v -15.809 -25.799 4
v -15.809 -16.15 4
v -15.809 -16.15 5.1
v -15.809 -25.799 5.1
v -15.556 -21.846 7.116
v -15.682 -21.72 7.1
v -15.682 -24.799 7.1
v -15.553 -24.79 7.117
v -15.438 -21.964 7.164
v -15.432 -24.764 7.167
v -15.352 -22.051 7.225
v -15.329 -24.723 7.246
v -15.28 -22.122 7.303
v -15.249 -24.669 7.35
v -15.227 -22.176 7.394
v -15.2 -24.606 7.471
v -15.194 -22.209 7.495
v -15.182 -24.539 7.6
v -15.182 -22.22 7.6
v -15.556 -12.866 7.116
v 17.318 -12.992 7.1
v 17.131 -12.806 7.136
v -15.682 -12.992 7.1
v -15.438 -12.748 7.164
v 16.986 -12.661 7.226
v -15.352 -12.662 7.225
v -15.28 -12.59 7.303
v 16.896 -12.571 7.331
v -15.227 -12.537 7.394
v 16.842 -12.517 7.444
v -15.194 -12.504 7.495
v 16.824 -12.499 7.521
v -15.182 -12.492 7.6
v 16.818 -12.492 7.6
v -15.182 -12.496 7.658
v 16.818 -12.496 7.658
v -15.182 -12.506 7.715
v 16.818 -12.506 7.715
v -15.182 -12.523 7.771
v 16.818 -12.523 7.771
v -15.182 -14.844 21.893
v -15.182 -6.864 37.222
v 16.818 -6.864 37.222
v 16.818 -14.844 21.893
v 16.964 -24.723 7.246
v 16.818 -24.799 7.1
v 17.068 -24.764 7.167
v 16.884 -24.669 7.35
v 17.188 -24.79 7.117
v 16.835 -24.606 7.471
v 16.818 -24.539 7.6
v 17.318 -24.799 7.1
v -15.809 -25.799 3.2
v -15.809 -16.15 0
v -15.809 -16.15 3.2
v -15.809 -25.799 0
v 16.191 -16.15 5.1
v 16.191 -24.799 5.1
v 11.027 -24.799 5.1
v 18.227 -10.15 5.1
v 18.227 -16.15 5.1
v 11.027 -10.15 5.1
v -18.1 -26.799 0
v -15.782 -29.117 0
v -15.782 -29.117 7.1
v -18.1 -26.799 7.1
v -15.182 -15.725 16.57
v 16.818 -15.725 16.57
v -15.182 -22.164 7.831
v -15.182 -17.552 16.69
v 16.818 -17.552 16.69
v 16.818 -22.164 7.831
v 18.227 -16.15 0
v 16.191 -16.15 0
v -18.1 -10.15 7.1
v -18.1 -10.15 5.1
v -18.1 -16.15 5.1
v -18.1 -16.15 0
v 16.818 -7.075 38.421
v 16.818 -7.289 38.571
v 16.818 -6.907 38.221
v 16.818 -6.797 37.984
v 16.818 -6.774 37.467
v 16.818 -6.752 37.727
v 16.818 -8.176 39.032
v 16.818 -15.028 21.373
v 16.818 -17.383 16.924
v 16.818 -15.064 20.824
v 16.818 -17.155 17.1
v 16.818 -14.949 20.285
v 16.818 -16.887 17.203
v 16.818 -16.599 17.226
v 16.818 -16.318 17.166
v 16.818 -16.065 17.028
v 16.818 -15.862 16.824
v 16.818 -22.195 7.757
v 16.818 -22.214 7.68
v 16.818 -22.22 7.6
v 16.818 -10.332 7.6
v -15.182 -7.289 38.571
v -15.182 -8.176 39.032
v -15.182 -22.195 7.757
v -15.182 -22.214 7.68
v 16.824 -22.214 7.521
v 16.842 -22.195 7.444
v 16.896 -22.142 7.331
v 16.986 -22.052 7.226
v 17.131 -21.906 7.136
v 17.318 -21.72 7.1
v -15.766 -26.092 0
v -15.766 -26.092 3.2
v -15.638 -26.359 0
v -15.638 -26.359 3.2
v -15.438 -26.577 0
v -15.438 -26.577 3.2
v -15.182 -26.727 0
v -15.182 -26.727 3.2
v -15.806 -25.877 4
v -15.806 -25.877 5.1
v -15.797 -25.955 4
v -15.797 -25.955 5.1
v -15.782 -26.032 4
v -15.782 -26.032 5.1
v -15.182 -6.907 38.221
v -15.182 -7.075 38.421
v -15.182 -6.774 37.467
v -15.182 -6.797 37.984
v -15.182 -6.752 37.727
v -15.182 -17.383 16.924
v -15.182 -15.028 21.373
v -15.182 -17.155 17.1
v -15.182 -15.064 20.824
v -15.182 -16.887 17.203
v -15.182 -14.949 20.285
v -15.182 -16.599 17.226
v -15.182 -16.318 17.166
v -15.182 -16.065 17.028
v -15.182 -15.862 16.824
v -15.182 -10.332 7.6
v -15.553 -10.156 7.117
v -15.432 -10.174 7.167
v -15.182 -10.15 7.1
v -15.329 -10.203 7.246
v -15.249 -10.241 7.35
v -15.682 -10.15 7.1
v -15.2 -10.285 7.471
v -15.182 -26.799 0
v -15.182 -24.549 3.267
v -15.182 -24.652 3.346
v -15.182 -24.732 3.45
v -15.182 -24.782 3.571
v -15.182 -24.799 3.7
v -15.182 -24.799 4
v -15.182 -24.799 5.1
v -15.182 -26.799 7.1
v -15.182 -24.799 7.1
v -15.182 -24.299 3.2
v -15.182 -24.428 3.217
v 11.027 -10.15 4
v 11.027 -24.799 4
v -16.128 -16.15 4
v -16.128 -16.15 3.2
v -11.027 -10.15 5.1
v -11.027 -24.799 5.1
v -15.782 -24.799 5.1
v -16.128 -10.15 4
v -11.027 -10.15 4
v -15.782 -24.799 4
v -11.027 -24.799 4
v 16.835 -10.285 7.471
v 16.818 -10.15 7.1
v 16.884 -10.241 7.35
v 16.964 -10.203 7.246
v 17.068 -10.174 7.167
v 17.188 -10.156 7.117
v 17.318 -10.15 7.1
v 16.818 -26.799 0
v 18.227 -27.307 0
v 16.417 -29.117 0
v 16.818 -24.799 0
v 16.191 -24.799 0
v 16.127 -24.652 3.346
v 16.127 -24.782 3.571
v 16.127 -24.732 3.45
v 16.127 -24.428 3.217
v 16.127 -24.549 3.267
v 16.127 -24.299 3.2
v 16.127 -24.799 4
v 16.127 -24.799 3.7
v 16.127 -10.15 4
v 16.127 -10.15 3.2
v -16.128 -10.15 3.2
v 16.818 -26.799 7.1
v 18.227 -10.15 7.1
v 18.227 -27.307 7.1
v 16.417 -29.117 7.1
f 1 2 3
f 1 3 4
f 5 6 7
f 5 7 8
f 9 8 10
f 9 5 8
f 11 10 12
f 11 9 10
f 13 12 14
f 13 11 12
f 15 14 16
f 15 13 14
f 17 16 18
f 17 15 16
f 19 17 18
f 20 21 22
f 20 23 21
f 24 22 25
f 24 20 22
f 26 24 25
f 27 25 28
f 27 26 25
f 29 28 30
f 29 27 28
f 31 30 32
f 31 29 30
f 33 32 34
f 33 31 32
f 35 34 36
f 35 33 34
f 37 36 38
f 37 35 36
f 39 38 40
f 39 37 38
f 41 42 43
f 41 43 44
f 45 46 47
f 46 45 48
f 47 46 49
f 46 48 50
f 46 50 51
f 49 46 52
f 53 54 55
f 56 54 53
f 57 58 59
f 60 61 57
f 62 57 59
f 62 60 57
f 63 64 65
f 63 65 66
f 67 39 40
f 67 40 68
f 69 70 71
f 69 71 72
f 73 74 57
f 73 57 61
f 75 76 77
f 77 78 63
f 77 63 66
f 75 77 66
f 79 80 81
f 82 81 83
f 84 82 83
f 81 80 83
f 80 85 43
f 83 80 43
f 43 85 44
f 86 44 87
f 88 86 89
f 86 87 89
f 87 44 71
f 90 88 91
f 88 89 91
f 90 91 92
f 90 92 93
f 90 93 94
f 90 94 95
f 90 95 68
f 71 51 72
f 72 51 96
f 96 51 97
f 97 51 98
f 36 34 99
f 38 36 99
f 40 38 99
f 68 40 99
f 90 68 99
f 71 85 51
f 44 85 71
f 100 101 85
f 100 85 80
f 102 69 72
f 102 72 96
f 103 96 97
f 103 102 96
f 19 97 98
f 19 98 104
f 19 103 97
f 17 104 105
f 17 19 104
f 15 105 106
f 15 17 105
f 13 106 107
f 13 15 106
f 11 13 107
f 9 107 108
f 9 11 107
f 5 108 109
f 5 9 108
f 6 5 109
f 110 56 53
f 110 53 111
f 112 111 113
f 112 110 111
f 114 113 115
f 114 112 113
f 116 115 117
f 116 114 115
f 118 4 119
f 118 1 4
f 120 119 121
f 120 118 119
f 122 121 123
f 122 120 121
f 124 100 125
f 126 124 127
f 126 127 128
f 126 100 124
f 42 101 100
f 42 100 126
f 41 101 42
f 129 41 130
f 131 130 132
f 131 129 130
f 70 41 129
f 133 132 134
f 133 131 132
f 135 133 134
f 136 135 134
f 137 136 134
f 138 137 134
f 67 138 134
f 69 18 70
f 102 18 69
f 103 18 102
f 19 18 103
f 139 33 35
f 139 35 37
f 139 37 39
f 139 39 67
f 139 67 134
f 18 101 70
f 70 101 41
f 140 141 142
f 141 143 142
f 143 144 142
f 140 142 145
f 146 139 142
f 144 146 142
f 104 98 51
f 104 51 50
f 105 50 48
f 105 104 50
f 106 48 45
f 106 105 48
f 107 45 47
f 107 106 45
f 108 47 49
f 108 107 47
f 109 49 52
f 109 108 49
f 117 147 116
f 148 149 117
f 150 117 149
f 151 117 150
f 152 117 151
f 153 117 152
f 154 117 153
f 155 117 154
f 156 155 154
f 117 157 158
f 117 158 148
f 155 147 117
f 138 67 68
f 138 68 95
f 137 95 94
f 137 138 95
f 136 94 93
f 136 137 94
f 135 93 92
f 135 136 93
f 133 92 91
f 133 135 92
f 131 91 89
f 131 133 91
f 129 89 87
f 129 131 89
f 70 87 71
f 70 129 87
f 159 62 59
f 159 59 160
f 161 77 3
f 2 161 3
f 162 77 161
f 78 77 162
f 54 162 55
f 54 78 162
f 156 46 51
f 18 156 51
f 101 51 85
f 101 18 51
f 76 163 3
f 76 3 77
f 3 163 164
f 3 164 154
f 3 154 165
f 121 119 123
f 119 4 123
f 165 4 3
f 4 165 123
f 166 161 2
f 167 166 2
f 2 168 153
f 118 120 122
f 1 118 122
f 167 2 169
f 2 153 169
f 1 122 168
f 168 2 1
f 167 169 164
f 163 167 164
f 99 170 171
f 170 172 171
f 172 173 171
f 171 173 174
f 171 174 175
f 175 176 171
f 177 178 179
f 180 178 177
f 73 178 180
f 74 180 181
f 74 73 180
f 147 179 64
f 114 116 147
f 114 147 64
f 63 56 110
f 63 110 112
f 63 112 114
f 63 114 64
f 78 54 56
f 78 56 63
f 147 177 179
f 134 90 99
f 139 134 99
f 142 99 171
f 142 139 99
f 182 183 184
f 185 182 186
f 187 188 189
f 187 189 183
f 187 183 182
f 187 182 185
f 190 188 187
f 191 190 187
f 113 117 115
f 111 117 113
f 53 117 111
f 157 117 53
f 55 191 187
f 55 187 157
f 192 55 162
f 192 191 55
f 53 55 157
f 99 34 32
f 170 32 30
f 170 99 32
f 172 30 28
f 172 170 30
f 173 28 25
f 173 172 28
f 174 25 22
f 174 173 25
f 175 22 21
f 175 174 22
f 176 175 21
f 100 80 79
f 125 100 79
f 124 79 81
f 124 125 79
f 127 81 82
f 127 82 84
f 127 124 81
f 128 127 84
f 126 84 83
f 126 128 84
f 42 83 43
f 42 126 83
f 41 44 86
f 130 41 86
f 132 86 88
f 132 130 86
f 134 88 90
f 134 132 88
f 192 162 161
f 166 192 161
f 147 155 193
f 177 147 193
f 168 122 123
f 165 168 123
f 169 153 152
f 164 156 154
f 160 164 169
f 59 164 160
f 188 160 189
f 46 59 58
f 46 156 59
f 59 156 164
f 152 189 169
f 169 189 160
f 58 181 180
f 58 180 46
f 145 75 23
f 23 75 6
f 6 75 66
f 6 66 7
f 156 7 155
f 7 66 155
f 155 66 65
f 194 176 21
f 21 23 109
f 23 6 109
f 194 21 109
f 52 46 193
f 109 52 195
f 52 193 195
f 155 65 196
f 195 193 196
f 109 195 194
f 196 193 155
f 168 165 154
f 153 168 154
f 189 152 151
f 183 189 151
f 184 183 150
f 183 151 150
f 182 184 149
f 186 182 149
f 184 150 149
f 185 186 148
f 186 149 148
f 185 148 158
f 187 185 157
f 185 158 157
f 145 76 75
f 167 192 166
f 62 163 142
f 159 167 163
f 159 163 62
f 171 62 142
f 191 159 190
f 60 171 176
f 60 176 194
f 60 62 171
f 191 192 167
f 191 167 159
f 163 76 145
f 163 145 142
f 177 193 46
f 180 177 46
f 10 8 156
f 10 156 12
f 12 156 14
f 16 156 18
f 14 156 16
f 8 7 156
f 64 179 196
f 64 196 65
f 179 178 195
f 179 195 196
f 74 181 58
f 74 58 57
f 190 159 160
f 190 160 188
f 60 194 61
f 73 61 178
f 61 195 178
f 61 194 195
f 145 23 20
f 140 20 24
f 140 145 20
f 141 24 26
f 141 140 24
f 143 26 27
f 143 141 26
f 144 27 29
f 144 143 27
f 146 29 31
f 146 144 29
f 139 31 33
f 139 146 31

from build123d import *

# Parameters (mm, degrees)
EXTRUDE_1_DEPTH             = 7.1
EXTRUDE_2_DEPTH             = 6
EXTRUDE_2_DIRECTION_2_REACH = 25.469
SKETCH_3_W                  = 32
SKETCH_3_H                  = 2
CUT_EXTRUDE_1_DEPTH         = 36.077992299
SKETCH_4_W                  = 0.599335356
SKETCH_4_H                  = 1.1
EXTRUDE_3_DEPTH             = 4.31849548
EXTRUDE_4_DEPTH             = 32
FILLET_1_R                  = 0.5


with BuildPart() as part:
    # 草图1 → 凸台-拉伸1 (new body)
    with BuildSketch(Plane.XY):
        with BuildLine():
            Line((18.227330455, -16.15), (18.227330455, -27.306853771))
            Line((18.227330455, -27.306853771), (16.416835991, -29.117348235))
            Line((16.416835991, -29.117348235), (5.554207951, -29.117348235))
            Line((5.554207951, -29.117348235), (-15.781834721, -29.117348235))
            Line((-15.781834721, -29.117348235), (-18.100330201, -26.798852755))
            Line((-18.100330201, -26.798852755), (-18.100330201, -16.15))
            Line((-18.100330201, -16.15), (-15.809499619, -16.15))
            Line((-15.809499619, -16.15), (-15.809499619, -25.798852755))
            ThreePointArc((-15.809499619, -25.798852755), (-15.5166064, -26.505959536), (-14.809499619, -26.798852755))
            Line((-14.809499619, -26.798852755), (15.190500381, -26.798852755))
            ThreePointArc((15.190500381, -26.798852755), (15.897607162, -26.505959536), (16.190500381, -25.798852755))
            Line((16.190500381, -25.798852755), (16.190500381, -16.15))
            Line((16.190500381, -16.15), (18.227330455, -16.15))
        make_face()
    extrude(amount=EXTRUDE_1_DEPTH)

    # 草图2 → 凸台-拉伸2 (add)
    with BuildSketch(Plane(origin=(0, -16.15, 0), x_dir=(1, 0, 0), z_dir=(0, 1, 0))):
        Polygon((16.127330455, -4.000000069), (16.127330455, -3.200000069), (-16.127758191, -3.200000069), (-16.127758191, -4), (-11.027330455, -4), (-11.027330455, -5.1), (-18.100330201, -5.1), (-18.100330201, -7.1), (18.227330455, -7.1), (18.227330455, -5.100000069), (11.027330455, -5.100000069), (11.027330455, -4.000000069), align=None)
    extrude(amount=EXTRUDE_2_DEPTH)

    # 草图2 → 凸台-拉伸2 direction 2 (add, up to next)
    with BuildSketch(Plane(origin=(0, -16.15, 0), x_dir=(1, 0, 0), z_dir=(0, 1, 0)), mode=Mode.PRIVATE) as extrude_2_direction_2_sk1:
        Polygon((16.127330455, -4.000000069), (16.127330455, -3.200000069), (-16.127758191, -3.200000069), (-16.127758191, -4), (-11.027330455, -4), (-11.027330455, -5.1), (-18.100330201, -5.1), (-18.100330201, -7.1), (18.227330455, -7.1), (18.227330455, -5.100000069), (11.027330455, -5.100000069), (11.027330455, -4.000000069), align=None)
    extrude_2_direction_2_tool1 = extrude(extrude_2_direction_2_sk1.sketch, amount=-EXTRUDE_2_DIRECTION_2_REACH, mode=Mode.PRIVATE) - part.part
    add(extrude_2_direction_2_tool1.solids().sort_by_distance((0.03755, -16.15, 5.267913))[0])

    # 草图3 → 切除-拉伸1 (cut, through all)
    with BuildSketch(Plane.XY.offset(7.1)):
        with Locations((0.817500635, -25.798852755)):
            Rectangle(SKETCH_3_W, SKETCH_3_H)
    extrude(amount=-CUT_EXTRUDE_1_DEPTH, mode=Mode.SUBTRACT)

    # 草图4 → 凸台-拉伸3 (add)
    with BuildSketch(Plane.XZ.offset(29.117348235)):
        with Locations((-15.482167043, 4.55)):
            Rectangle(SKETCH_4_W, SKETCH_4_H)
    extrude(amount=-EXTRUDE_3_DEPTH)

    # 草图5 → 凸台-拉伸4 (add)
    with BuildSketch(Plane(origin=(-15.182499365, 0, 0), x_dir=(0, 0, -1), z_dir=(1, 0, 0))):
        with BuildLine():
            Line((-7.1, -24.798852755), (-39.032389994, -8.175902679))
            Line((-39.032389994, -8.175902679), (-38.570641381, -7.288891846))
            ThreePointArc((-38.570641381, -7.288891846), (-37.984336348, -6.796923508), (-37.221881935, -6.863629626))
            Line((-37.221881935, -6.863629626), (-21.892534432, -14.843582842))
            ThreePointArc((-21.892534432, -14.843582842), (-21.099843464, -15.065279022), (-20.284996919, -14.948946417))
            Line((-20.284996919, -14.948946417), (-7.1, -10.15))
            Line((-7.1, -10.15), (-7.1, -12.278355545))
            Line((-7.1, -12.278355545), (-16.570152711, -15.725209246))
            ThreePointArc((-16.570152711, -15.725209246), (-17.225991491, -16.599498737), (-16.689881181, -17.5519127))
            Line((-16.689881181, -17.5519127), (-7.1, -22.544088861))
            Line((-7.1, -22.544088861), (-7.1, -24.798852755))
        make_face()
    extrude(amount=EXTRUDE_4_DEPTH)

    # 圆角1
    # the kernel refuses this fillet: 0.5 mm, written as the material it adds along each edge
    with BuildSketch(Plane(origin=(-15.182499365, -21.294088861, 7.1), x_dir=(-1, 0, 0), z_dir=(0, -1, 0))) as fillet_1_piece_1_section:
        with BuildLine():
            CenterArc((FILLET_1_R, -FILLET_1_R), FILLET_1_R, 90, 90)
            Line((0, -FILLET_1_R), (-FILLET_1_R * 0.02, -FILLET_1_R))
            Line((-FILLET_1_R * 0.02, -FILLET_1_R), (-FILLET_1_R * 0.02, FILLET_1_R * 0.02))
            Line((-FILLET_1_R * 0.02, FILLET_1_R * 0.02), (FILLET_1_R, FILLET_1_R * 0.02))
            Line((FILLET_1_R, FILLET_1_R * 0.02), (FILLET_1_R, 0))
        make_face()
    fillet_1_piece_1 = extrude(amount=4.754763894, mode=Mode.PRIVATE)
    fillet_1_piece_1 = split(fillet_1_piece_1, bisect_by=Plane(origin=(-15.182499365, -23.618510105, 7.201736565), z_dir=(-1, 0, 0)), keep=Keep.TOP, mode=Mode.PRIVATE)
    fillet_1_piece_1 = split(fillet_1_piece_1, bisect_by=Plane(origin=(-15.30597489, -24.505520938, 7.663485178), z_dir=(0, 0.8870108331782195, -0.46174861323503813)), keep=Keep.TOP, mode=Mode.PRIVATE)
    fillet_1_piece_1 = split(fillet_1_piece_1, bisect_by=Plane(origin=(-15.30597489, -22.731499272, 6.739987952), z_dir=(0, -0.8870108331782195, 0.4617486132350387)), keep=Keep.TOP, mode=Mode.PRIVATE)
    add(fillet_1_piece_1)
    with BuildSketch(Plane(origin=(-15.182499365, -22.544088861, 7.1), x_dir=(0, 1, 0), z_dir=(1, 0, 0))) as fillet_1_piece_2:
        with BuildLine():
            CenterArc((FILLET_1_R * 1.64794899742, FILLET_1_R), FILLET_1_R, 152.5, 117.5)
            Line((FILLET_1_R * 0.76093816424, FILLET_1_R * 1.46174861324), (FILLET_1_R * 0.743197947576, FILLET_1_R * 1.4709835855))
            Line((FILLET_1_R * 0.743197947576, FILLET_1_R * 1.4709835855), (-FILLET_1_R * 0.0329589799484, -FILLET_1_R * 0.02))
            Line((-FILLET_1_R * 0.0329589799484, -FILLET_1_R * 0.02), (FILLET_1_R * 1.64794899742, -FILLET_1_R * 0.02))
            Line((FILLET_1_R * 1.64794899742, -FILLET_1_R * 0.02), (FILLET_1_R * 1.64794899742, 0))
        make_face()
    extrude(amount=32)
    with BuildSketch(Plane(origin=(-15.182499365, -12.278355545, 7.1), x_dir=(0, -1, 0), z_dir=(1, 0, 0))) as fillet_1_piece_3:
        with BuildLine():
            CenterArc((FILLET_1_R * 1.42814800674, -FILLET_1_R), FILLET_1_R, 90, 110)
            Line((FILLET_1_R * 0.488455385956, -FILLET_1_R * 1.34202014333), (FILLET_1_R * 0.46966153354, -FILLET_1_R * 1.34886054619))
            Line((FILLET_1_R * 0.46966153354, -FILLET_1_R * 1.34886054619), (-FILLET_1_R * 0.0285629601348, FILLET_1_R * 0.02))
            Line((-FILLET_1_R * 0.0285629601348, FILLET_1_R * 0.02), (FILLET_1_R * 1.42814800674, FILLET_1_R * 0.02))
            Line((FILLET_1_R * 1.42814800674, FILLET_1_R * 0.02), (FILLET_1_R * 1.42814800674, 0))
        make_face()
    extrude(amount=32)
    with BuildSketch(Plane(origin=(-15.182499365, -10.15, 7.1), x_dir=(-1, 0, 0), z_dir=(0, -1, 0))) as fillet_1_piece_4_section:
        with BuildLine():
            CenterArc((FILLET_1_R, -FILLET_1_R), FILLET_1_R, 90, 90)
            Line((0, -FILLET_1_R), (-FILLET_1_R * 0.02, -FILLET_1_R))
            Line((-FILLET_1_R * 0.02, -FILLET_1_R), (-FILLET_1_R * 0.02, FILLET_1_R * 0.02))
            Line((-FILLET_1_R * 0.02, FILLET_1_R * 0.02), (FILLET_1_R, FILLET_1_R * 0.02))
            Line((FILLET_1_R, FILLET_1_R * 0.02), (FILLET_1_R, 0))
        make_face()
    fillet_1_piece_4 = extrude(amount=3.378355545, mode=Mode.PRIVATE)
    fillet_1_piece_4 = split(fillet_1_piece_4, bisect_by=Plane(origin=(-15.295687906, -12.195082425, 6.871208984), z_dir=(0, 0.9396926207859094, 0.34202014332566616)), keep=Keep.TOP, mode=Mode.PRIVATE)
    fillet_1_piece_4 = split(fillet_1_piece_4, bisect_by=Plane(origin=(-15.295687906, -10.315697184, 7.55524927), z_dir=(0, -0.9396926207859093, -0.34202014332566627)), keep=Keep.TOP, mode=Mode.PRIVATE)
    add(fillet_1_piece_4)
    with BuildSketch(Plane(origin=(16.817500635, -21.294088861, 7.1), x_dir=(1, 0, 0), z_dir=(0, -1, 0))) as fillet_1_piece_5_section:
        with BuildLine():
            CenterArc((FILLET_1_R, FILLET_1_R), FILLET_1_R, 180, 90)
            Line((0, FILLET_1_R), (-FILLET_1_R * 0.02, FILLET_1_R))
            Line((-FILLET_1_R * 0.02, FILLET_1_R), (-FILLET_1_R * 0.02, -FILLET_1_R * 0.02))
            Line((-FILLET_1_R * 0.02, -FILLET_1_R * 0.02), (FILLET_1_R, -FILLET_1_R * 0.02))
            Line((FILLET_1_R, -FILLET_1_R * 0.02), (FILLET_1_R, 0))
        make_face()
    fillet_1_piece_5 = extrude(amount=4.754763894, mode=Mode.PRIVATE)
    fillet_1_piece_5 = split(fillet_1_piece_5, bisect_by=Plane(origin=(16.817500635, -23.618510105, 7.201736565), z_dir=(1, 0, 0)), keep=Keep.TOP, mode=Mode.PRIVATE)
    fillet_1_piece_5 = split(fillet_1_piece_5, bisect_by=Plane(origin=(16.94097616, -24.505520938, 7.663485178), z_dir=(0, 0.8870108331782195, -0.46174861323503813)), keep=Keep.TOP, mode=Mode.PRIVATE)
    fillet_1_piece_5 = split(fillet_1_piece_5, bisect_by=Plane(origin=(16.94097616, -22.731499272, 6.739987952), z_dir=(0, -0.8870108331782195, 0.4617486132350387)), keep=Keep.TOP, mode=Mode.PRIVATE)
    add(fillet_1_piece_5)
    with BuildSketch(Plane(origin=(16.817500635, -10.15, 7.1), x_dir=(1, 0, 0), z_dir=(0, -1, 0))) as fillet_1_piece_6_section:
        with BuildLine():
            CenterArc((FILLET_1_R, FILLET_1_R), FILLET_1_R, 180, 90)
            Line((0, FILLET_1_R), (-FILLET_1_R * 0.02, FILLET_1_R))
            Line((-FILLET_1_R * 0.02, FILLET_1_R), (-FILLET_1_R * 0.02, -FILLET_1_R * 0.02))
            Line((-FILLET_1_R * 0.02, -FILLET_1_R * 0.02), (FILLET_1_R, -FILLET_1_R * 0.02))
            Line((FILLET_1_R, -FILLET_1_R * 0.02), (FILLET_1_R, 0))
        make_face()
    fillet_1_piece_6 = extrude(amount=3.378355545, mode=Mode.PRIVATE)
    fillet_1_piece_6 = split(fillet_1_piece_6, bisect_by=Plane(origin=(16.930689176, -10.315697184, 7.55524927), z_dir=(0, -0.9396926207859093, -0.34202014332566627)), keep=Keep.TOP, mode=Mode.PRIVATE)
    fillet_1_piece_6 = split(fillet_1_piece_6, bisect_by=Plane(origin=(16.930689176, -12.195082425, 6.871208984), z_dir=(0, 0.9396926207859094, 0.34202014332566616)), keep=Keep.TOP, mode=Mode.PRIVATE)
    add(fillet_1_piece_6)
    with BuildSketch(Plane(origin=(-15.182499365, -21.294088861, 7.1), x_dir=(-1, 0, 0), z_dir=(0, -1, 0))) as fillet_1_piece_7a_section:
        with BuildLine():
            CenterArc((FILLET_1_R, -FILLET_1_R), FILLET_1_R, 90, 90)
            Line((0, -FILLET_1_R), (-FILLET_1_R * 0.02, -FILLET_1_R))
            Line((-FILLET_1_R * 0.02, -FILLET_1_R), (-FILLET_1_R * 0.02, FILLET_1_R * 0.02))
            Line((-FILLET_1_R * 0.02, FILLET_1_R * 0.02), (FILLET_1_R, FILLET_1_R * 0.02))
            Line((FILLET_1_R, FILLET_1_R * 0.02), (FILLET_1_R, 0))
        make_face()
    fillet_1_piece_7a = extrude(amount=4.754763894, mode=Mode.PRIVATE)
    fillet_1_piece_7a = split(fillet_1_piece_7a, bisect_by=Plane(origin=(-15.182499365, -21.893638872, 7.197777948), z_dir=(-1, 0, 0)), keep=Keep.TOP, mode=Mode.PRIVATE)
    fillet_1_piece_7a = split(fillet_1_piece_7a, bisect_by=Plane(origin=(-15.308579206, -22.365357757, 7.443339257), z_dir=(0, 0.8870108331782195, -0.4617486132350387)), keep=Keep.TOP, mode=Mode.PRIVATE)
    with BuildSketch(Plane(origin=(-17.242435612, -22.544088861, 7.1), x_dir=(0, 1, 0), z_dir=(1, 0, 0))) as fillet_1_piece_7b_section:
        with BuildLine():
            CenterArc((FILLET_1_R * 1.64794899742, FILLET_1_R), FILLET_1_R, 152.5, 117.5)
            Line((FILLET_1_R * 0.76093816424, FILLET_1_R * 1.46174861324), (FILLET_1_R * 0.743197947576, FILLET_1_R * 1.4709835855))
            Line((FILLET_1_R * 0.743197947576, FILLET_1_R * 1.4709835855), (-FILLET_1_R * 0.0329589799484, -FILLET_1_R * 0.02))
            Line((-FILLET_1_R * 0.0329589799484, -FILLET_1_R * 0.02), (FILLET_1_R * 1.64794899742, -FILLET_1_R * 0.02))
            Line((FILLET_1_R * 1.64794899742, -FILLET_1_R * 0.02), (FILLET_1_R * 1.64794899742, 0))
        make_face()
    fillet_1_piece_7b = extrude(amount=34.059936247, mode=Mode.PRIVATE)
    fillet_1_piece_7b = split(fillet_1_piece_7b, bisect_by=Plane(origin=(-15.182499365, -22.251163965, 7.277751191), z_dir=(-1, 0, 0)), keep=Keep.TOP, mode=Mode.PRIVATE)
    fillet_1_piece_7 = fillet_1_piece_7a & fillet_1_piece_7b
    add(fillet_1_piece_7)
    with BuildSketch(Plane(origin=(-15.182499365, -22.544088861, 7.1), x_dir=(0, 1, 0), z_dir=(1, 0, 0))) as fillet_1_piece_8a_section:
        with BuildLine():
            CenterArc((FILLET_1_R * 1.64794899742, FILLET_1_R), FILLET_1_R, 152.5, 117.5)
            Line((FILLET_1_R * 0.76093816424, FILLET_1_R * 1.46174861324), (FILLET_1_R * 0.743197947576, FILLET_1_R * 1.4709835855))
            Line((FILLET_1_R * 0.743197947576, FILLET_1_R * 1.4709835855), (-FILLET_1_R * 0.0329589799484, -FILLET_1_R * 0.02))
            Line((-FILLET_1_R * 0.0329589799484, -FILLET_1_R * 0.02), (FILLET_1_R * 1.64794899742, -FILLET_1_R * 0.02))
            Line((FILLET_1_R * 1.64794899742, -FILLET_1_R * 0.02), (FILLET_1_R * 1.64794899742, 0))
        make_face()
    fillet_1_piece_8a = extrude(amount=34.059936247, mode=Mode.PRIVATE)
    fillet_1_piece_8a = split(fillet_1_piece_8a, bisect_by=Plane(origin=(16.817500635, -22.251163965, 7.277751191), z_dir=(1, 0, 0)), keep=Keep.TOP, mode=Mode.PRIVATE)
    with BuildSketch(Plane(origin=(16.817500635, -21.294088861, 7.1), x_dir=(1, 0, 0), z_dir=(0, -1, 0))) as fillet_1_piece_8b_section:
        with BuildLine():
            CenterArc((FILLET_1_R, FILLET_1_R), FILLET_1_R, 180, 90)
            Line((0, FILLET_1_R), (-FILLET_1_R * 0.02, FILLET_1_R))
            Line((-FILLET_1_R * 0.02, FILLET_1_R), (-FILLET_1_R * 0.02, -FILLET_1_R * 0.02))
            Line((-FILLET_1_R * 0.02, -FILLET_1_R * 0.02), (FILLET_1_R, -FILLET_1_R * 0.02))
            Line((FILLET_1_R, -FILLET_1_R * 0.02), (FILLET_1_R, 0))
        make_face()
    fillet_1_piece_8b = extrude(amount=4.754763894, mode=Mode.PRIVATE)
    fillet_1_piece_8b = split(fillet_1_piece_8b, bisect_by=Plane(origin=(16.817500635, -21.893638872, 7.197777948), z_dir=(1, 0, 0)), keep=Keep.TOP, mode=Mode.PRIVATE)
    fillet_1_piece_8b = split(fillet_1_piece_8b, bisect_by=Plane(origin=(16.943580476, -22.365357757, 7.443339257), z_dir=(0, 0.8870108331782195, -0.4617486132350387)), keep=Keep.TOP, mode=Mode.PRIVATE)
    fillet_1_piece_8 = fillet_1_piece_8a & fillet_1_piece_8b
    add(fillet_1_piece_8)
    with BuildSketch(Plane(origin=(-16.967684373, -12.278355545, 7.1), x_dir=(0, -1, 0), z_dir=(1, 0, 0))) as fillet_1_piece_9a_section:
        with BuildLine():
            CenterArc((FILLET_1_R * 1.42814800674, -FILLET_1_R), FILLET_1_R, 90, 110)
            Line((FILLET_1_R * 0.488455385956, -FILLET_1_R * 1.34202014333), (FILLET_1_R * 0.46966153354, -FILLET_1_R * 1.34886054619))
            Line((FILLET_1_R * 0.46966153354, -FILLET_1_R * 1.34886054619), (-FILLET_1_R * 0.0285629601348, FILLET_1_R * 0.02))
            Line((-FILLET_1_R * 0.0285629601348, FILLET_1_R * 0.02), (FILLET_1_R * 1.42814800674, FILLET_1_R * 0.02))
            Line((FILLET_1_R * 1.42814800674, FILLET_1_R * 0.02), (FILLET_1_R * 1.42814800674, 0))
        make_face()
    fillet_1_piece_9a = extrude(amount=33.785185008, mode=Mode.PRIVATE)
    fillet_1_piece_9a = split(fillet_1_piece_9a, bisect_by=Plane(origin=(-15.182499365, -12.506130836, 7.259489976), z_dir=(-1, 0, 0)), keep=Keep.TOP, mode=Mode.PRIVATE)
    with BuildSketch(Plane(origin=(-15.182499365, -10.15, 7.1), x_dir=(-1, 0, 0), z_dir=(0, -1, 0))) as fillet_1_piece_9b_section:
        with BuildLine():
            CenterArc((FILLET_1_R, -FILLET_1_R), FILLET_1_R, 90, 90)
            Line((0, -FILLET_1_R), (-FILLET_1_R * 0.02, -FILLET_1_R))
            Line((-FILLET_1_R * 0.02, -FILLET_1_R), (-FILLET_1_R * 0.02, FILLET_1_R * 0.02))
            Line((-FILLET_1_R * 0.02, FILLET_1_R * 0.02), (FILLET_1_R, FILLET_1_R * 0.02))
            Line((FILLET_1_R, FILLET_1_R * 0.02), (FILLET_1_R, 0))
        make_face()
    fillet_1_piece_9b = extrude(amount=3.378355545, mode=Mode.PRIVATE)
    fillet_1_piece_9b = split(fillet_1_piece_9b, bisect_by=Plane(origin=(-15.29776373, -12.389058539, 7.404153976), z_dir=(0, -0.9396926207859094, -0.34202014332566616)), keep=Keep.TOP, mode=Mode.PRIVATE)
    fillet_1_piece_9 = fillet_1_piece_9a & fillet_1_piece_9b
    add(fillet_1_piece_9)
    with BuildSketch(Plane(origin=(16.817500635, -10.15, 7.1), x_dir=(1, 0, 0), z_dir=(0, -1, 0))) as fillet_1_piece_10a_section:
        with BuildLine():
            CenterArc((FILLET_1_R, FILLET_1_R), FILLET_1_R, 180, 90)
            Line((0, FILLET_1_R), (-FILLET_1_R * 0.02, FILLET_1_R))
            Line((-FILLET_1_R * 0.02, FILLET_1_R), (-FILLET_1_R * 0.02, -FILLET_1_R * 0.02))
            Line((-FILLET_1_R * 0.02, -FILLET_1_R * 0.02), (FILLET_1_R, -FILLET_1_R * 0.02))
            Line((FILLET_1_R, -FILLET_1_R * 0.02), (FILLET_1_R, 0))
        make_face()
    fillet_1_piece_10a = extrude(amount=3.378355545, mode=Mode.PRIVATE)
    fillet_1_piece_10a = split(fillet_1_piece_10a, bisect_by=Plane(origin=(16.932765, -12.389058539, 7.404153976), z_dir=(0, -0.9396926207859094, -0.34202014332566616)), keep=Keep.TOP, mode=Mode.PRIVATE)
    with BuildSketch(Plane(origin=(-15.182499365, -12.278355545, 7.1), x_dir=(0, -1, 0), z_dir=(1, 0, 0))) as fillet_1_piece_10b_section:
        with BuildLine():
            CenterArc((FILLET_1_R * 1.42814800674, -FILLET_1_R), FILLET_1_R, 90, 110)
            Line((FILLET_1_R * 0.488455385956, -FILLET_1_R * 1.34202014333), (FILLET_1_R * 0.46966153354, -FILLET_1_R * 1.34886054619))
            Line((FILLET_1_R * 0.46966153354, -FILLET_1_R * 1.34886054619), (-FILLET_1_R * 0.0285629601348, FILLET_1_R * 0.02))
            Line((-FILLET_1_R * 0.0285629601348, FILLET_1_R * 0.02), (FILLET_1_R * 1.42814800674, FILLET_1_R * 0.02))
            Line((FILLET_1_R * 1.42814800674, FILLET_1_R * 0.02), (FILLET_1_R * 1.42814800674, 0))
        make_face()
    fillet_1_piece_10b = extrude(amount=33.785185008, mode=Mode.PRIVATE)
    fillet_1_piece_10b = split(fillet_1_piece_10b, bisect_by=Plane(origin=(16.817500635, -12.506130836, 7.259489976), z_dir=(1, 0, 0)), keep=Keep.TOP, mode=Mode.PRIVATE)
    fillet_1_piece_10 = fillet_1_piece_10a & fillet_1_piece_10b
    add(fillet_1_piece_10)
    # the kernel refuses this fillet: 0.5 mm, written as the material it takes off along each edge
    with BuildSketch(Plane(origin=(-15.182499365, -24.798852755, 3.200000069), x_dir=(0, 0, 1), z_dir=(1, 0, 0))) as fillet_1_2_piece_1:
        with BuildLine():
            CenterArc((FILLET_1_R, -FILLET_1_R), FILLET_1_R, 90, 90)
            Line((0, -FILLET_1_R), (-FILLET_1_R * 0.02, -FILLET_1_R))
            Line((-FILLET_1_R * 0.02, -FILLET_1_R), (-FILLET_1_R * 0.02, FILLET_1_R * 0.02))
            Line((-FILLET_1_R * 0.02, FILLET_1_R * 0.02), (FILLET_1_R, FILLET_1_R * 0.02))
            Line((FILLET_1_R, FILLET_1_R * 0.02), (FILLET_1_R, 0))
        make_face()
    extrude(amount=31.30982982, mode=Mode.SUBTRACT)


solid = part.part
